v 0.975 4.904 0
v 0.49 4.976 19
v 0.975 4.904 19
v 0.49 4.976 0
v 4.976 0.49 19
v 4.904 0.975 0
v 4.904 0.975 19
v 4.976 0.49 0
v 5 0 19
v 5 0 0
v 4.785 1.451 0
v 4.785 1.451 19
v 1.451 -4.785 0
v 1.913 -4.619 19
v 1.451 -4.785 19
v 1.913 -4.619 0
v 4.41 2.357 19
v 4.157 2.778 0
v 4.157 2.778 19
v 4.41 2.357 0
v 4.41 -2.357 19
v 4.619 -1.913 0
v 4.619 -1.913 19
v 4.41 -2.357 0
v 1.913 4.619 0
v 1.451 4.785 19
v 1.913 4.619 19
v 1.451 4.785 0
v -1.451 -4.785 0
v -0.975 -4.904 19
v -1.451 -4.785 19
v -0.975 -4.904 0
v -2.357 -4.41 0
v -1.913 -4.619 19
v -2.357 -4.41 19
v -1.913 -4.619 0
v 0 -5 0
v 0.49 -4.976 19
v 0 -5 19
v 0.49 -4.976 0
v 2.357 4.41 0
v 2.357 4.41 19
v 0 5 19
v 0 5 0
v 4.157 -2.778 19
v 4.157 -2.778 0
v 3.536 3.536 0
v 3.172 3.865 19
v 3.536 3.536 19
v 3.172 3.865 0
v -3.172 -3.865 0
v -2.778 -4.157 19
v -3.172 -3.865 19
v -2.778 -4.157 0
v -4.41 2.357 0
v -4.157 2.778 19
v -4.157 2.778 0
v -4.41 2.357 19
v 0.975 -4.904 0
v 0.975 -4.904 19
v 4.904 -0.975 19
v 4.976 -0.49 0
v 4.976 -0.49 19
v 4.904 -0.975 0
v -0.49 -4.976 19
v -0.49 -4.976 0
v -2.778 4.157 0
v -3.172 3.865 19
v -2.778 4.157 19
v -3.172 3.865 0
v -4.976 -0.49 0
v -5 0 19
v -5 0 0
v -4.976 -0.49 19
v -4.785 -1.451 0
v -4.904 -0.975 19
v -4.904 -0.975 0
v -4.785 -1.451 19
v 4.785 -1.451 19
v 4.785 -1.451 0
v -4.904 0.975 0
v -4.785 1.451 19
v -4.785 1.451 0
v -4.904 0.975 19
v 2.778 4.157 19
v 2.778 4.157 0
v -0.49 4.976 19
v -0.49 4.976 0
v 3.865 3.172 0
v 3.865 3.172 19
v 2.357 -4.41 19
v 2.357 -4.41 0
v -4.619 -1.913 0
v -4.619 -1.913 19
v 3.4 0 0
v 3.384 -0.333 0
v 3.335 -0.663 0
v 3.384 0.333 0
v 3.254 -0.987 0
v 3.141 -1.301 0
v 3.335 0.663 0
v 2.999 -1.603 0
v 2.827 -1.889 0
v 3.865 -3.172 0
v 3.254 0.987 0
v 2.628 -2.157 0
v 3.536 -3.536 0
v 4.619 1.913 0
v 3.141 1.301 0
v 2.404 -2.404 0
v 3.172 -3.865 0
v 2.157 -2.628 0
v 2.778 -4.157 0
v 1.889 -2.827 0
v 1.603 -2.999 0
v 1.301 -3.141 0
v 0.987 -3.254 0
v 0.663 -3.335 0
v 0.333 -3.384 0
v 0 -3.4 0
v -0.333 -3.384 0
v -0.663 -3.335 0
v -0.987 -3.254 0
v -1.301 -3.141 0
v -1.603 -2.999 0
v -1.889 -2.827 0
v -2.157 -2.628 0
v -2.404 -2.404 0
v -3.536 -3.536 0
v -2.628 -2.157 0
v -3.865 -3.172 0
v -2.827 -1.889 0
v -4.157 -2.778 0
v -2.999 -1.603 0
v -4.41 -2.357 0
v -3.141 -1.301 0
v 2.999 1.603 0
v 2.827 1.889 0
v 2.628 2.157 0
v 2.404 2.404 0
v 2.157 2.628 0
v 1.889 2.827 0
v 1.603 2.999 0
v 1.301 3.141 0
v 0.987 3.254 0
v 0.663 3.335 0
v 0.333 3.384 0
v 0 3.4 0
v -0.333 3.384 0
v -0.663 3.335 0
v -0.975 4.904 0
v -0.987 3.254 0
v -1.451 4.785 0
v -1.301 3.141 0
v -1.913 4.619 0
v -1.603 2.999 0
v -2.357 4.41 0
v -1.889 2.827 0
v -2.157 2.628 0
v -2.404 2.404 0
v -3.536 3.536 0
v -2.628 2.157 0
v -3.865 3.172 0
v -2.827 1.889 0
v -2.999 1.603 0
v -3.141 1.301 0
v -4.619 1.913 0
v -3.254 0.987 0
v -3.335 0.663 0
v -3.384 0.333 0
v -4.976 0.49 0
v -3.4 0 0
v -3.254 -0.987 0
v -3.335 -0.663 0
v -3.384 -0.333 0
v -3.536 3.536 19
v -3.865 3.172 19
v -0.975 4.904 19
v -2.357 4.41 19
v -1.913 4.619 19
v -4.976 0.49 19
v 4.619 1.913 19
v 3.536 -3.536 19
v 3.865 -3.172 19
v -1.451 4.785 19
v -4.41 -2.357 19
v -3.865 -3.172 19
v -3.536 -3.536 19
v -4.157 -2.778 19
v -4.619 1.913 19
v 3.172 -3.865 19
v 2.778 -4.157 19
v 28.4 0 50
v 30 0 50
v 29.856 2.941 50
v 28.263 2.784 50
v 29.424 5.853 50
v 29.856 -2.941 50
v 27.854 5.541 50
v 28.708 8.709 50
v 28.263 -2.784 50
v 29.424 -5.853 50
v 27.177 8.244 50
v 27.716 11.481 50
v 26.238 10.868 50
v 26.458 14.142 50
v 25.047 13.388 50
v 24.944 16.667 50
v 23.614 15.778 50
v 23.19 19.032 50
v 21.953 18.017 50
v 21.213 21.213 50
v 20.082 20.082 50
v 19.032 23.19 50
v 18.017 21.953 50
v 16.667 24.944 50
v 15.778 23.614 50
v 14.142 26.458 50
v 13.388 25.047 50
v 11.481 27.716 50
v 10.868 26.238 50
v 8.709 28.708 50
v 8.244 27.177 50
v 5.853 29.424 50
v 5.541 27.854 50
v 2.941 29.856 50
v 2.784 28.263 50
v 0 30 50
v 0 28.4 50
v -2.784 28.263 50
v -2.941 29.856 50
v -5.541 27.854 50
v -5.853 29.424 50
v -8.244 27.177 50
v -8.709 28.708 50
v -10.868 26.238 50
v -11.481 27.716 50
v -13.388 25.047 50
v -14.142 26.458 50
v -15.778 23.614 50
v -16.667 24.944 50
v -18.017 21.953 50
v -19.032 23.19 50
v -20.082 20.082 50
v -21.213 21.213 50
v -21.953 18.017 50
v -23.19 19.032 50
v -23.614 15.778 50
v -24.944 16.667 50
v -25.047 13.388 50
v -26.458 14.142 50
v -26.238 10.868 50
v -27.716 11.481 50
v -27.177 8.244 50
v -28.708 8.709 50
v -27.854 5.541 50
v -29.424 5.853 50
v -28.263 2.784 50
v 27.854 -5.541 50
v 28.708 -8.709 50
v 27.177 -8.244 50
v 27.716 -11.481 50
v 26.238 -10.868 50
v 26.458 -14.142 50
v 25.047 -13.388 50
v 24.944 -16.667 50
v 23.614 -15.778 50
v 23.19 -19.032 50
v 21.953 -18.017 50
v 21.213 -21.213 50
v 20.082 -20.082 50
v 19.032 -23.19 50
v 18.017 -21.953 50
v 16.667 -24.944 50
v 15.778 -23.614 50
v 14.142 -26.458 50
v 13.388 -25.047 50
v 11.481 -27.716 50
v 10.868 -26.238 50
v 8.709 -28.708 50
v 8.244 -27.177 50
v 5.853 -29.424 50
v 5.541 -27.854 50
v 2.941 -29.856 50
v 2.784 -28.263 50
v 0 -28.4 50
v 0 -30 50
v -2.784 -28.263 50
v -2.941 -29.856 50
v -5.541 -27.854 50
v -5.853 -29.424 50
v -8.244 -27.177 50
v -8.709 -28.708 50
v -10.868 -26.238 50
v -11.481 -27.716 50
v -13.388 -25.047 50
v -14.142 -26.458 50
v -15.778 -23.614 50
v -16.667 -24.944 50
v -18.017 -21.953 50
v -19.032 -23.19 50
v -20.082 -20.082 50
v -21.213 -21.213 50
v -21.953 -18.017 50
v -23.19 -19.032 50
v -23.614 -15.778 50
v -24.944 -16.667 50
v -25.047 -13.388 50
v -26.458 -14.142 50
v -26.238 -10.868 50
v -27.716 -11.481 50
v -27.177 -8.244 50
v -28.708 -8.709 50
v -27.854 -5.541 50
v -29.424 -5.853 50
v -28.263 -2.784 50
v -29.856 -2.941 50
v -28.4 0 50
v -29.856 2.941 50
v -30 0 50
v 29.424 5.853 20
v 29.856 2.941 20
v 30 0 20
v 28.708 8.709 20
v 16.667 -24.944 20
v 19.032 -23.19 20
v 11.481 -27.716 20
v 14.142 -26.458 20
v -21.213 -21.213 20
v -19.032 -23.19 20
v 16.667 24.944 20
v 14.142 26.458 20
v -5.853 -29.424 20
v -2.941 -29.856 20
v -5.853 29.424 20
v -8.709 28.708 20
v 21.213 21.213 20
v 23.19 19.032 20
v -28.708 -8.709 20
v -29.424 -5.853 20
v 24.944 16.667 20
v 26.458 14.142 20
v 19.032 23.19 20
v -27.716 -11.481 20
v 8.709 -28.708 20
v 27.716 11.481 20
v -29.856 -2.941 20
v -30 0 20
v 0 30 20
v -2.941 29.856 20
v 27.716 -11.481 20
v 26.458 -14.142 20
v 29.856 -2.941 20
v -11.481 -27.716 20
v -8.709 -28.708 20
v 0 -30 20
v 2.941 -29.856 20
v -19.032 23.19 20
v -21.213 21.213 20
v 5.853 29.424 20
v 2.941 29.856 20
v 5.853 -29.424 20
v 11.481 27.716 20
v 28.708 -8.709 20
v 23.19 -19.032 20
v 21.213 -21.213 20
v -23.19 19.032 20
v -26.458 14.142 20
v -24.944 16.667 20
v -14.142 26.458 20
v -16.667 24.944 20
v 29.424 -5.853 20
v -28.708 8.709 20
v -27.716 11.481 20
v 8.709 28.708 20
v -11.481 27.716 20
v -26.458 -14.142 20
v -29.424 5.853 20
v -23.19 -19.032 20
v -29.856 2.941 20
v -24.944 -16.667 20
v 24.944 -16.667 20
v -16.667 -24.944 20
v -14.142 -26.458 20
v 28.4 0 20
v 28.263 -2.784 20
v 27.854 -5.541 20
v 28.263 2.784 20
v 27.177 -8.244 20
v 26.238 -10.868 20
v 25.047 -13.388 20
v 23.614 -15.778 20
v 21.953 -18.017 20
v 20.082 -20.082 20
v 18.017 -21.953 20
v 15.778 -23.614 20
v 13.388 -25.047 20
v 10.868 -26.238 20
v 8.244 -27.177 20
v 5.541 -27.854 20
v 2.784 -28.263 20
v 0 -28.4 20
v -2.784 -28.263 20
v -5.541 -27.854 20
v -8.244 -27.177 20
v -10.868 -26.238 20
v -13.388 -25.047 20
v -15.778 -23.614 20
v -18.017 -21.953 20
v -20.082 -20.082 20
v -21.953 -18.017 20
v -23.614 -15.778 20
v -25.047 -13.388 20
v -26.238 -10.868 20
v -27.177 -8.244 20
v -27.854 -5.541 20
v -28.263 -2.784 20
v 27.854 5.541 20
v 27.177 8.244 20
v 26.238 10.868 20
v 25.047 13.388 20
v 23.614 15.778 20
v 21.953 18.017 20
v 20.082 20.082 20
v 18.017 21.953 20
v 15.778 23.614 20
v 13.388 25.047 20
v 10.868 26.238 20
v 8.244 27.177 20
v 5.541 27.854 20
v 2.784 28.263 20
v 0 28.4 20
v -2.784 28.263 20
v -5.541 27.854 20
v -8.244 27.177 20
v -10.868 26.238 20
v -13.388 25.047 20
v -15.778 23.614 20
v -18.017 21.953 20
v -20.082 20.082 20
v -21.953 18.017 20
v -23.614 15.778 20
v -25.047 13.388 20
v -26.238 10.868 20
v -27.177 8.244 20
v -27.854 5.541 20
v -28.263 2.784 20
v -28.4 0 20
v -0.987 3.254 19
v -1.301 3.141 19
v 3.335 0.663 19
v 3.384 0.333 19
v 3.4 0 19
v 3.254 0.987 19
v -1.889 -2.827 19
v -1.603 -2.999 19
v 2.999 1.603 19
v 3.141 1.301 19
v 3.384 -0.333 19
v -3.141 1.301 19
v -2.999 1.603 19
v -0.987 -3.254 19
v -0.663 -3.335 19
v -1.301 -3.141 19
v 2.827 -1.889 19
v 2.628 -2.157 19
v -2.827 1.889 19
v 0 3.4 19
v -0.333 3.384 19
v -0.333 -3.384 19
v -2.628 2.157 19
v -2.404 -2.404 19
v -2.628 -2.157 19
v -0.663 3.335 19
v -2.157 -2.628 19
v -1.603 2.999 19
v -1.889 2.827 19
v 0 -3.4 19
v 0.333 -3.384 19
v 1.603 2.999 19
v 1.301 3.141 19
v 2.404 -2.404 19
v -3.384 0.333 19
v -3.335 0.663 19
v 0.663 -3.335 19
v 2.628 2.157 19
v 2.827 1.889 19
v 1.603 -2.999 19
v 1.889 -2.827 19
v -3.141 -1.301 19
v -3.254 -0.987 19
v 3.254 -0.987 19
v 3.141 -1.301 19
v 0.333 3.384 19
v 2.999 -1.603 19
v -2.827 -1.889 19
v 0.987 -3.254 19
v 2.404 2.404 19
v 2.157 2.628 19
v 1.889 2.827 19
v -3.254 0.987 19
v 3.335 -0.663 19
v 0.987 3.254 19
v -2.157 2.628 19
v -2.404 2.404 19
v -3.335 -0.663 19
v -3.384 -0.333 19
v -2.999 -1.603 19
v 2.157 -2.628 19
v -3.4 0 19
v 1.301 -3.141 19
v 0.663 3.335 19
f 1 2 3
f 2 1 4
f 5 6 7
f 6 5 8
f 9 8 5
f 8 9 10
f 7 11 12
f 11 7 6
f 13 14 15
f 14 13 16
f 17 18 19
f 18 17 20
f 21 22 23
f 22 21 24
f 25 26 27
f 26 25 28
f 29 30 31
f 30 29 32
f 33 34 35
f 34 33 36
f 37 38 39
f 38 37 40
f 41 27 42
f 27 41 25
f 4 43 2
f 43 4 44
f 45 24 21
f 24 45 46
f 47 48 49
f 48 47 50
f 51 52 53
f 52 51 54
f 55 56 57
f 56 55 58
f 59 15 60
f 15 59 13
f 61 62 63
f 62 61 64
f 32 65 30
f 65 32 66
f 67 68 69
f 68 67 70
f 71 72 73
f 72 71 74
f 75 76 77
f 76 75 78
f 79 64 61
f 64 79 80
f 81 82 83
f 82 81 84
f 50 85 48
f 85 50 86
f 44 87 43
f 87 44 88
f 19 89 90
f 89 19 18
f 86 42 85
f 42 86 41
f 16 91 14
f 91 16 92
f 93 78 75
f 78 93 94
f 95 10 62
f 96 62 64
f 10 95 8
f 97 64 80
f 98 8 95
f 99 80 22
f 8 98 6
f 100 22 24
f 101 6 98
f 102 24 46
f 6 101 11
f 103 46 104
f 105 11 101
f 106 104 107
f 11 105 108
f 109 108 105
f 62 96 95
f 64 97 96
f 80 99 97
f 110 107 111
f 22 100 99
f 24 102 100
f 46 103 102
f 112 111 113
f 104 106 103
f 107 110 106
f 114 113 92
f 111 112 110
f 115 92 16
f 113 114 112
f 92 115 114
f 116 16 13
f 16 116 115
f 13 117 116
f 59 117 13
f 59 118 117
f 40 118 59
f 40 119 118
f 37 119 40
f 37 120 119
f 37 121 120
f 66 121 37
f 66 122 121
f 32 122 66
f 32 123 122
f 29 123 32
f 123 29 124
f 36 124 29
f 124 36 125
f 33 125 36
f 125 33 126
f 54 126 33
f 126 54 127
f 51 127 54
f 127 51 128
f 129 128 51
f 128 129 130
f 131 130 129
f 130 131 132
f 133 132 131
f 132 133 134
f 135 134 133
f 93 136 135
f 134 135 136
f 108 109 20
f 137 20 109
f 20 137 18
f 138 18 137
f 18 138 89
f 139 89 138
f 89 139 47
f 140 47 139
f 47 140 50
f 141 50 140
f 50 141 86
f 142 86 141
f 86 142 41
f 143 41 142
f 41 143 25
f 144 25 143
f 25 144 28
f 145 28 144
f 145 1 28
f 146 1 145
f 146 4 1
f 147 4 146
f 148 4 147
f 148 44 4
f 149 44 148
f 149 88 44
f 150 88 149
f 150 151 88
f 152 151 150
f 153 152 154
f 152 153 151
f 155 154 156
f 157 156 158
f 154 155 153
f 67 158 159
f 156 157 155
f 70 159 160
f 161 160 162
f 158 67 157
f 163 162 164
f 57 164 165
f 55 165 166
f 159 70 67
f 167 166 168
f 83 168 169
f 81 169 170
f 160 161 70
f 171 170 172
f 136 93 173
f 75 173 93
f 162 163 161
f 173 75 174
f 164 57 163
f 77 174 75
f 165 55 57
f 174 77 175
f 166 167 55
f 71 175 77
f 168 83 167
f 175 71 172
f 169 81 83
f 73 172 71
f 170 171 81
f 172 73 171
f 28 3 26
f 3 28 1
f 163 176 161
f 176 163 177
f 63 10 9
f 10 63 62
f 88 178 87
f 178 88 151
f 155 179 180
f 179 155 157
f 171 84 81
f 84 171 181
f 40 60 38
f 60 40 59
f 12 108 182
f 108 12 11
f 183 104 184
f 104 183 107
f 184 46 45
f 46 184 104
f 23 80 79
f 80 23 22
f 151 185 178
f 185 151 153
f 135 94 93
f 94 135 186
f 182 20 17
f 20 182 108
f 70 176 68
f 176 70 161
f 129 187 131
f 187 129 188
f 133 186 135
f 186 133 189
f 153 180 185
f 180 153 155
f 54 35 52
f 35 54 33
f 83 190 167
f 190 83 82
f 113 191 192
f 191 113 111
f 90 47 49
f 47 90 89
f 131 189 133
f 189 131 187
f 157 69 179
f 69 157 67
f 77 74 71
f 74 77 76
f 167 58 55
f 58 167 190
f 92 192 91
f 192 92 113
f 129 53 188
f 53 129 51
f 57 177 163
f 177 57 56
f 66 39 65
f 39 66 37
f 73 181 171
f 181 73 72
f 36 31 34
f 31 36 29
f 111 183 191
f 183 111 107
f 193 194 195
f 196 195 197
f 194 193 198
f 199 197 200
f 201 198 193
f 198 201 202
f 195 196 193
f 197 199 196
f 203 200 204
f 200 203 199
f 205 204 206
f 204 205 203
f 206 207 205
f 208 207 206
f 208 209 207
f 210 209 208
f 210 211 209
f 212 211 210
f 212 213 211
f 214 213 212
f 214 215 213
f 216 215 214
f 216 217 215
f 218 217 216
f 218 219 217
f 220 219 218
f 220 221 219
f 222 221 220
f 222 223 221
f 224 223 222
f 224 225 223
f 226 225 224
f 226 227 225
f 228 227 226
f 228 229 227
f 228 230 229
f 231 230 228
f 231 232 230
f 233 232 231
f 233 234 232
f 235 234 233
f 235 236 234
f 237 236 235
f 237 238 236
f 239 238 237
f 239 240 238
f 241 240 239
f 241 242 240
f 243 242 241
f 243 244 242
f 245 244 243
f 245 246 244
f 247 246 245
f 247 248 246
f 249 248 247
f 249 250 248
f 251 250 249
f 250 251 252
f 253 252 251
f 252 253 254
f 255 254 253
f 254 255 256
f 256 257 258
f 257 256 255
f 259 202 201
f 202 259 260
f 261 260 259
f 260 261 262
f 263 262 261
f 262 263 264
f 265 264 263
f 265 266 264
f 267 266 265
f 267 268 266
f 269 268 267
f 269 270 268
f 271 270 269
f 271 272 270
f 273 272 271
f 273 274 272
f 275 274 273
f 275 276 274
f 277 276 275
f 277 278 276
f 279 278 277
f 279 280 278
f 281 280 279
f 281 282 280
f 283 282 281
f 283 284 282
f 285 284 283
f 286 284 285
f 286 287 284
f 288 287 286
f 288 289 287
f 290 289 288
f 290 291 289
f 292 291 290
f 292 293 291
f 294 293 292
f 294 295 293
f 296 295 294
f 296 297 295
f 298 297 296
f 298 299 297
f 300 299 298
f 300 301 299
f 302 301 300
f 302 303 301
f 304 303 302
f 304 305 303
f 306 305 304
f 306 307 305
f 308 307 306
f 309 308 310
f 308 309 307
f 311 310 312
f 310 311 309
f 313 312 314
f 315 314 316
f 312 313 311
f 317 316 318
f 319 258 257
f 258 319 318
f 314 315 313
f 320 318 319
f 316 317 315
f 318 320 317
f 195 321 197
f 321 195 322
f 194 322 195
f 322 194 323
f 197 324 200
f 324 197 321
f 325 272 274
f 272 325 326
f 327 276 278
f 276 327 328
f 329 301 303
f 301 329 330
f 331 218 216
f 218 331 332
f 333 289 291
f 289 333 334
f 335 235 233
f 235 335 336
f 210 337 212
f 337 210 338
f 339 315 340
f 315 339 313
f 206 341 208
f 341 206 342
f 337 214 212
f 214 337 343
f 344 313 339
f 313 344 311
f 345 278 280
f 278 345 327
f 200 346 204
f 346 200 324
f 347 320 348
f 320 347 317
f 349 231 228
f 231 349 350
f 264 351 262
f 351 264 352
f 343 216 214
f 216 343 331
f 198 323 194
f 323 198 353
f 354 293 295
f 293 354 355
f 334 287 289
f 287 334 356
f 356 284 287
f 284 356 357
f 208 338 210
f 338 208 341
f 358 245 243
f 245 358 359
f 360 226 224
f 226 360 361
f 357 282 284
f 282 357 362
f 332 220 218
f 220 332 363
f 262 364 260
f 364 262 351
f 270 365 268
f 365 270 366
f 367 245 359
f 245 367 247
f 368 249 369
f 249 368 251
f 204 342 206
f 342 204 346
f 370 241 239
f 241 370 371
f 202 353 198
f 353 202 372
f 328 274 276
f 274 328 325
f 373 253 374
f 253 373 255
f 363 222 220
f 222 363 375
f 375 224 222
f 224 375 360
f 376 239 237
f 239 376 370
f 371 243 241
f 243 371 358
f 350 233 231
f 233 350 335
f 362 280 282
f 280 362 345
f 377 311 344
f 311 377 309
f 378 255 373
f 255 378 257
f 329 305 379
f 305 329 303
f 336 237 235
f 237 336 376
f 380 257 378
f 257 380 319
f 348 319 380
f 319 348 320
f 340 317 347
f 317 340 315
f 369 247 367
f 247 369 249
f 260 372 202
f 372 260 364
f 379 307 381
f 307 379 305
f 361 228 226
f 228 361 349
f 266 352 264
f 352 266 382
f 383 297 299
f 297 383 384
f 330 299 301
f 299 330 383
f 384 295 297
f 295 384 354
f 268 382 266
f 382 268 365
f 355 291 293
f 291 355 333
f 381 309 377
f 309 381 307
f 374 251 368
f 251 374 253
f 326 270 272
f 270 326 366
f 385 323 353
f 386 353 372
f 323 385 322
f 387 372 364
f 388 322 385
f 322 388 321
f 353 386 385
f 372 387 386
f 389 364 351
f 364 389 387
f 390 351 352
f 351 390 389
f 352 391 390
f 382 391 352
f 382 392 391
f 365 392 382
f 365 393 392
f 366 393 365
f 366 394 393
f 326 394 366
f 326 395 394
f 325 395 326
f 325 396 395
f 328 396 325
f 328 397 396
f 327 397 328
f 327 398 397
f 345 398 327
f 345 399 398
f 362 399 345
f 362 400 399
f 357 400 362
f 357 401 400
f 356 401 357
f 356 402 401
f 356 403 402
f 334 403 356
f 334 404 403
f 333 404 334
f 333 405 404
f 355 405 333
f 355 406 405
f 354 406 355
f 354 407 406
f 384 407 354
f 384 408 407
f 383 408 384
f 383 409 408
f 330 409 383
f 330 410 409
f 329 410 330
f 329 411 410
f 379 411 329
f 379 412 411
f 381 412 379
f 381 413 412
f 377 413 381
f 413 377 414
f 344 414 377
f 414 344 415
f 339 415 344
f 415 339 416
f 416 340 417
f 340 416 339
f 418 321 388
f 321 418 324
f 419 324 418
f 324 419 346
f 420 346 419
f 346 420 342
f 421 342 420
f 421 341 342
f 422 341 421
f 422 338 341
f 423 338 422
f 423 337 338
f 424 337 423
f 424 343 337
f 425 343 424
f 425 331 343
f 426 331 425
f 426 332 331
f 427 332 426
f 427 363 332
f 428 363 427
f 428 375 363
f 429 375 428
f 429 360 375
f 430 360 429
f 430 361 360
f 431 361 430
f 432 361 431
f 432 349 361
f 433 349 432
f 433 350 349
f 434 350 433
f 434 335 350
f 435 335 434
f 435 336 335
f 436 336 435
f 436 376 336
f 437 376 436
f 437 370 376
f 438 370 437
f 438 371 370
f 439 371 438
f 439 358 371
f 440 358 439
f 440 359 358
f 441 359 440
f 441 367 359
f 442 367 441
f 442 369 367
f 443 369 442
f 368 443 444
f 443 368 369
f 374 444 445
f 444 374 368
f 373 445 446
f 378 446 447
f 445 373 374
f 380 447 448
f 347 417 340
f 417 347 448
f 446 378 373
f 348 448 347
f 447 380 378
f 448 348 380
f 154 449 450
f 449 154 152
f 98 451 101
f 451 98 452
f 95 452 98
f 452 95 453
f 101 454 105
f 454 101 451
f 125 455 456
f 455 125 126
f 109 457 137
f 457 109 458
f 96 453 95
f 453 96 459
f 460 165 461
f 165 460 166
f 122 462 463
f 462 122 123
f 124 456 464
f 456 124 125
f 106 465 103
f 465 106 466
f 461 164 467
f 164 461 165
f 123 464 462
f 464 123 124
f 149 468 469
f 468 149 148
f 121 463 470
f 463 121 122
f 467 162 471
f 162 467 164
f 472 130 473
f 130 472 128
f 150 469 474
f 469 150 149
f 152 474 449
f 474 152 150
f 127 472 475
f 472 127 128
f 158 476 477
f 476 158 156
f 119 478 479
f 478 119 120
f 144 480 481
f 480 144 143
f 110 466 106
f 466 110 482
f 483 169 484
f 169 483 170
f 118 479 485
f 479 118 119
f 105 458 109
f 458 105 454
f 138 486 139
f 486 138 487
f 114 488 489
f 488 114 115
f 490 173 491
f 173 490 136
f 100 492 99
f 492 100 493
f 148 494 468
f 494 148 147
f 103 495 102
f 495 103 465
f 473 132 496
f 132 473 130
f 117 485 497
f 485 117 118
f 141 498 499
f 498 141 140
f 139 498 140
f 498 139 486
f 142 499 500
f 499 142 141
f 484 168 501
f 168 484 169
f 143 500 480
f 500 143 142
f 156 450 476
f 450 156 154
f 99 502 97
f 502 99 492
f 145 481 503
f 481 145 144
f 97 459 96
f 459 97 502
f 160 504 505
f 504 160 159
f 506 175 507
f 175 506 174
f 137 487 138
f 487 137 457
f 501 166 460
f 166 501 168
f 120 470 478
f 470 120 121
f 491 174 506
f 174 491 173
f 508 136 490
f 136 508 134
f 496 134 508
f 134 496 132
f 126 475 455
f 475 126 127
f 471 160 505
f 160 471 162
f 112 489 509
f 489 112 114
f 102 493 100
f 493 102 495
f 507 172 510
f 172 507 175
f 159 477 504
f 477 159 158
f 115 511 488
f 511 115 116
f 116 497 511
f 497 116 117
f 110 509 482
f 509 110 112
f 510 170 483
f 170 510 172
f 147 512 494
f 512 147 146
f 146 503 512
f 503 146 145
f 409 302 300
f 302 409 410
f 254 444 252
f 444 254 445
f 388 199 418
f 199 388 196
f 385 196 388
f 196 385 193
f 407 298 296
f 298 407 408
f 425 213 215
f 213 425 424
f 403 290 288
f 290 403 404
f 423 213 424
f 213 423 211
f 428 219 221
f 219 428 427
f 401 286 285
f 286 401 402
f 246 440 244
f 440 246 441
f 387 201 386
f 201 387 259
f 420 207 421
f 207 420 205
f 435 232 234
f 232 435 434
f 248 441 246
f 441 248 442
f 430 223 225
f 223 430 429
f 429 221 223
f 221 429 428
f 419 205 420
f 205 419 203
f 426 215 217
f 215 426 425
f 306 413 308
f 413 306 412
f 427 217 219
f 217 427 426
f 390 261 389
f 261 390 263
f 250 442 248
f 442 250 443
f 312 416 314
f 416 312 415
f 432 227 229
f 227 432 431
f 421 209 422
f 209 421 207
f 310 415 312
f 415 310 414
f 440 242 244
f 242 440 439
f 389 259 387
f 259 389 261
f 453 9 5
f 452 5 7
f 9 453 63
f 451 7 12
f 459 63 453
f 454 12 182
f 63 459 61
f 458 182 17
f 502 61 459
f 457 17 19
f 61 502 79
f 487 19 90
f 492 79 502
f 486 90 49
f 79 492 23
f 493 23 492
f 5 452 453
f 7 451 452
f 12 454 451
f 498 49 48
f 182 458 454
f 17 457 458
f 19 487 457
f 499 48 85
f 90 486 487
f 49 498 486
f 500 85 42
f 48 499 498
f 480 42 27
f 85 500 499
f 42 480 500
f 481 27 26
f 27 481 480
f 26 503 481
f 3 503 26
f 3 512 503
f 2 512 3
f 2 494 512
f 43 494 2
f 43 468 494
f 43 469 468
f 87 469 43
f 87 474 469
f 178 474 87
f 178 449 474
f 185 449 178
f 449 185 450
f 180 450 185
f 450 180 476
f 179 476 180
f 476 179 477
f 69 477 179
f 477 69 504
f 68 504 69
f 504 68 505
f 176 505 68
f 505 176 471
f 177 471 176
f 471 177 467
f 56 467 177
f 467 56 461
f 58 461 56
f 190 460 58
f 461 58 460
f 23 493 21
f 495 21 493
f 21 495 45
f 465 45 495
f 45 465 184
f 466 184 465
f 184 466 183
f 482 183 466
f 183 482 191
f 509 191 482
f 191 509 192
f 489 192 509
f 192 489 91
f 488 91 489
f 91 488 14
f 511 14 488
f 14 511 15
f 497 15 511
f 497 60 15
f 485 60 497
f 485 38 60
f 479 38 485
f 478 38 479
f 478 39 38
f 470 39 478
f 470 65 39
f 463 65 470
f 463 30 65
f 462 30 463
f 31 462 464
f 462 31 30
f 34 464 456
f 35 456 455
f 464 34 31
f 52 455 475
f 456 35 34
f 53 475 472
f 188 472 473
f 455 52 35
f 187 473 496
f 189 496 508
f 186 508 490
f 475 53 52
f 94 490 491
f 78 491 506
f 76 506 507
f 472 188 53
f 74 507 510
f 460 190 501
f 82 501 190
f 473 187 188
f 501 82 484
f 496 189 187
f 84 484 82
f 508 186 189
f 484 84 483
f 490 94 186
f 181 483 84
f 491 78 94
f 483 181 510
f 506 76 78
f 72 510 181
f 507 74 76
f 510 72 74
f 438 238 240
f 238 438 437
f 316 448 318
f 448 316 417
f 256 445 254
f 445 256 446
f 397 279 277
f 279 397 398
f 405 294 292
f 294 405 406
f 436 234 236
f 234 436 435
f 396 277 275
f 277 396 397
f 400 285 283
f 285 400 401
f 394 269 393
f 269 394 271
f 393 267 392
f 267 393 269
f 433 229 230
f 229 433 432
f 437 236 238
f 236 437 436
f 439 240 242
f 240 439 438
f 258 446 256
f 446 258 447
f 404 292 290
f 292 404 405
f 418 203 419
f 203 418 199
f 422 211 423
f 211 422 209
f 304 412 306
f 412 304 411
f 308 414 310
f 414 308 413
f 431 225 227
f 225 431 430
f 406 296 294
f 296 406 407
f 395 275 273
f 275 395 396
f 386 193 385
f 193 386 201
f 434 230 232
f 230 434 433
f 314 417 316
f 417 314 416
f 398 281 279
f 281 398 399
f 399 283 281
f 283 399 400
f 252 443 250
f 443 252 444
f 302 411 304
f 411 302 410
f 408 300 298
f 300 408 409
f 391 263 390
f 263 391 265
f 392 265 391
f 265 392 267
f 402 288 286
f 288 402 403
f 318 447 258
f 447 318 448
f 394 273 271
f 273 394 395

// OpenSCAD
// Funnel - a straight spout (tube) topped by a conical section, open at both ends for fluid
// flow. NOVEL general part for a lab bench or a custom assembly.
//

spout_d = 10;
spout_l = 20;
cone_d  = 60;
wall    = 1.6;

$fn = 64;

ib = spout_d - 2 * wall;          // spout bore
ic = cone_d - 2 * wall;           // cone inner diameter at its narrow end

difference() {
    union() {
        cylinder(h = spout_l, d = spout_d);                 // spout
        translate([0, 0, spout_l]) cylinder(h = 30, d = spout_d);  // tube section of cone
        translate([0, 0, spout_l]) cylinder(h = 30, d = cone_d);  // conical section
    }
    translate([0, 0, -1]) cylinder(h = spout_l + 2, d = ib);                     // bore through spout
    translate([0, 0, spout_l - 1]) cylinder(h = 32, d = ic);                     // cone inner space
    translate([0, 0, spout_l]) cylinder(h = 30, d = spout_d);  // remove the duplicate tube section
}
